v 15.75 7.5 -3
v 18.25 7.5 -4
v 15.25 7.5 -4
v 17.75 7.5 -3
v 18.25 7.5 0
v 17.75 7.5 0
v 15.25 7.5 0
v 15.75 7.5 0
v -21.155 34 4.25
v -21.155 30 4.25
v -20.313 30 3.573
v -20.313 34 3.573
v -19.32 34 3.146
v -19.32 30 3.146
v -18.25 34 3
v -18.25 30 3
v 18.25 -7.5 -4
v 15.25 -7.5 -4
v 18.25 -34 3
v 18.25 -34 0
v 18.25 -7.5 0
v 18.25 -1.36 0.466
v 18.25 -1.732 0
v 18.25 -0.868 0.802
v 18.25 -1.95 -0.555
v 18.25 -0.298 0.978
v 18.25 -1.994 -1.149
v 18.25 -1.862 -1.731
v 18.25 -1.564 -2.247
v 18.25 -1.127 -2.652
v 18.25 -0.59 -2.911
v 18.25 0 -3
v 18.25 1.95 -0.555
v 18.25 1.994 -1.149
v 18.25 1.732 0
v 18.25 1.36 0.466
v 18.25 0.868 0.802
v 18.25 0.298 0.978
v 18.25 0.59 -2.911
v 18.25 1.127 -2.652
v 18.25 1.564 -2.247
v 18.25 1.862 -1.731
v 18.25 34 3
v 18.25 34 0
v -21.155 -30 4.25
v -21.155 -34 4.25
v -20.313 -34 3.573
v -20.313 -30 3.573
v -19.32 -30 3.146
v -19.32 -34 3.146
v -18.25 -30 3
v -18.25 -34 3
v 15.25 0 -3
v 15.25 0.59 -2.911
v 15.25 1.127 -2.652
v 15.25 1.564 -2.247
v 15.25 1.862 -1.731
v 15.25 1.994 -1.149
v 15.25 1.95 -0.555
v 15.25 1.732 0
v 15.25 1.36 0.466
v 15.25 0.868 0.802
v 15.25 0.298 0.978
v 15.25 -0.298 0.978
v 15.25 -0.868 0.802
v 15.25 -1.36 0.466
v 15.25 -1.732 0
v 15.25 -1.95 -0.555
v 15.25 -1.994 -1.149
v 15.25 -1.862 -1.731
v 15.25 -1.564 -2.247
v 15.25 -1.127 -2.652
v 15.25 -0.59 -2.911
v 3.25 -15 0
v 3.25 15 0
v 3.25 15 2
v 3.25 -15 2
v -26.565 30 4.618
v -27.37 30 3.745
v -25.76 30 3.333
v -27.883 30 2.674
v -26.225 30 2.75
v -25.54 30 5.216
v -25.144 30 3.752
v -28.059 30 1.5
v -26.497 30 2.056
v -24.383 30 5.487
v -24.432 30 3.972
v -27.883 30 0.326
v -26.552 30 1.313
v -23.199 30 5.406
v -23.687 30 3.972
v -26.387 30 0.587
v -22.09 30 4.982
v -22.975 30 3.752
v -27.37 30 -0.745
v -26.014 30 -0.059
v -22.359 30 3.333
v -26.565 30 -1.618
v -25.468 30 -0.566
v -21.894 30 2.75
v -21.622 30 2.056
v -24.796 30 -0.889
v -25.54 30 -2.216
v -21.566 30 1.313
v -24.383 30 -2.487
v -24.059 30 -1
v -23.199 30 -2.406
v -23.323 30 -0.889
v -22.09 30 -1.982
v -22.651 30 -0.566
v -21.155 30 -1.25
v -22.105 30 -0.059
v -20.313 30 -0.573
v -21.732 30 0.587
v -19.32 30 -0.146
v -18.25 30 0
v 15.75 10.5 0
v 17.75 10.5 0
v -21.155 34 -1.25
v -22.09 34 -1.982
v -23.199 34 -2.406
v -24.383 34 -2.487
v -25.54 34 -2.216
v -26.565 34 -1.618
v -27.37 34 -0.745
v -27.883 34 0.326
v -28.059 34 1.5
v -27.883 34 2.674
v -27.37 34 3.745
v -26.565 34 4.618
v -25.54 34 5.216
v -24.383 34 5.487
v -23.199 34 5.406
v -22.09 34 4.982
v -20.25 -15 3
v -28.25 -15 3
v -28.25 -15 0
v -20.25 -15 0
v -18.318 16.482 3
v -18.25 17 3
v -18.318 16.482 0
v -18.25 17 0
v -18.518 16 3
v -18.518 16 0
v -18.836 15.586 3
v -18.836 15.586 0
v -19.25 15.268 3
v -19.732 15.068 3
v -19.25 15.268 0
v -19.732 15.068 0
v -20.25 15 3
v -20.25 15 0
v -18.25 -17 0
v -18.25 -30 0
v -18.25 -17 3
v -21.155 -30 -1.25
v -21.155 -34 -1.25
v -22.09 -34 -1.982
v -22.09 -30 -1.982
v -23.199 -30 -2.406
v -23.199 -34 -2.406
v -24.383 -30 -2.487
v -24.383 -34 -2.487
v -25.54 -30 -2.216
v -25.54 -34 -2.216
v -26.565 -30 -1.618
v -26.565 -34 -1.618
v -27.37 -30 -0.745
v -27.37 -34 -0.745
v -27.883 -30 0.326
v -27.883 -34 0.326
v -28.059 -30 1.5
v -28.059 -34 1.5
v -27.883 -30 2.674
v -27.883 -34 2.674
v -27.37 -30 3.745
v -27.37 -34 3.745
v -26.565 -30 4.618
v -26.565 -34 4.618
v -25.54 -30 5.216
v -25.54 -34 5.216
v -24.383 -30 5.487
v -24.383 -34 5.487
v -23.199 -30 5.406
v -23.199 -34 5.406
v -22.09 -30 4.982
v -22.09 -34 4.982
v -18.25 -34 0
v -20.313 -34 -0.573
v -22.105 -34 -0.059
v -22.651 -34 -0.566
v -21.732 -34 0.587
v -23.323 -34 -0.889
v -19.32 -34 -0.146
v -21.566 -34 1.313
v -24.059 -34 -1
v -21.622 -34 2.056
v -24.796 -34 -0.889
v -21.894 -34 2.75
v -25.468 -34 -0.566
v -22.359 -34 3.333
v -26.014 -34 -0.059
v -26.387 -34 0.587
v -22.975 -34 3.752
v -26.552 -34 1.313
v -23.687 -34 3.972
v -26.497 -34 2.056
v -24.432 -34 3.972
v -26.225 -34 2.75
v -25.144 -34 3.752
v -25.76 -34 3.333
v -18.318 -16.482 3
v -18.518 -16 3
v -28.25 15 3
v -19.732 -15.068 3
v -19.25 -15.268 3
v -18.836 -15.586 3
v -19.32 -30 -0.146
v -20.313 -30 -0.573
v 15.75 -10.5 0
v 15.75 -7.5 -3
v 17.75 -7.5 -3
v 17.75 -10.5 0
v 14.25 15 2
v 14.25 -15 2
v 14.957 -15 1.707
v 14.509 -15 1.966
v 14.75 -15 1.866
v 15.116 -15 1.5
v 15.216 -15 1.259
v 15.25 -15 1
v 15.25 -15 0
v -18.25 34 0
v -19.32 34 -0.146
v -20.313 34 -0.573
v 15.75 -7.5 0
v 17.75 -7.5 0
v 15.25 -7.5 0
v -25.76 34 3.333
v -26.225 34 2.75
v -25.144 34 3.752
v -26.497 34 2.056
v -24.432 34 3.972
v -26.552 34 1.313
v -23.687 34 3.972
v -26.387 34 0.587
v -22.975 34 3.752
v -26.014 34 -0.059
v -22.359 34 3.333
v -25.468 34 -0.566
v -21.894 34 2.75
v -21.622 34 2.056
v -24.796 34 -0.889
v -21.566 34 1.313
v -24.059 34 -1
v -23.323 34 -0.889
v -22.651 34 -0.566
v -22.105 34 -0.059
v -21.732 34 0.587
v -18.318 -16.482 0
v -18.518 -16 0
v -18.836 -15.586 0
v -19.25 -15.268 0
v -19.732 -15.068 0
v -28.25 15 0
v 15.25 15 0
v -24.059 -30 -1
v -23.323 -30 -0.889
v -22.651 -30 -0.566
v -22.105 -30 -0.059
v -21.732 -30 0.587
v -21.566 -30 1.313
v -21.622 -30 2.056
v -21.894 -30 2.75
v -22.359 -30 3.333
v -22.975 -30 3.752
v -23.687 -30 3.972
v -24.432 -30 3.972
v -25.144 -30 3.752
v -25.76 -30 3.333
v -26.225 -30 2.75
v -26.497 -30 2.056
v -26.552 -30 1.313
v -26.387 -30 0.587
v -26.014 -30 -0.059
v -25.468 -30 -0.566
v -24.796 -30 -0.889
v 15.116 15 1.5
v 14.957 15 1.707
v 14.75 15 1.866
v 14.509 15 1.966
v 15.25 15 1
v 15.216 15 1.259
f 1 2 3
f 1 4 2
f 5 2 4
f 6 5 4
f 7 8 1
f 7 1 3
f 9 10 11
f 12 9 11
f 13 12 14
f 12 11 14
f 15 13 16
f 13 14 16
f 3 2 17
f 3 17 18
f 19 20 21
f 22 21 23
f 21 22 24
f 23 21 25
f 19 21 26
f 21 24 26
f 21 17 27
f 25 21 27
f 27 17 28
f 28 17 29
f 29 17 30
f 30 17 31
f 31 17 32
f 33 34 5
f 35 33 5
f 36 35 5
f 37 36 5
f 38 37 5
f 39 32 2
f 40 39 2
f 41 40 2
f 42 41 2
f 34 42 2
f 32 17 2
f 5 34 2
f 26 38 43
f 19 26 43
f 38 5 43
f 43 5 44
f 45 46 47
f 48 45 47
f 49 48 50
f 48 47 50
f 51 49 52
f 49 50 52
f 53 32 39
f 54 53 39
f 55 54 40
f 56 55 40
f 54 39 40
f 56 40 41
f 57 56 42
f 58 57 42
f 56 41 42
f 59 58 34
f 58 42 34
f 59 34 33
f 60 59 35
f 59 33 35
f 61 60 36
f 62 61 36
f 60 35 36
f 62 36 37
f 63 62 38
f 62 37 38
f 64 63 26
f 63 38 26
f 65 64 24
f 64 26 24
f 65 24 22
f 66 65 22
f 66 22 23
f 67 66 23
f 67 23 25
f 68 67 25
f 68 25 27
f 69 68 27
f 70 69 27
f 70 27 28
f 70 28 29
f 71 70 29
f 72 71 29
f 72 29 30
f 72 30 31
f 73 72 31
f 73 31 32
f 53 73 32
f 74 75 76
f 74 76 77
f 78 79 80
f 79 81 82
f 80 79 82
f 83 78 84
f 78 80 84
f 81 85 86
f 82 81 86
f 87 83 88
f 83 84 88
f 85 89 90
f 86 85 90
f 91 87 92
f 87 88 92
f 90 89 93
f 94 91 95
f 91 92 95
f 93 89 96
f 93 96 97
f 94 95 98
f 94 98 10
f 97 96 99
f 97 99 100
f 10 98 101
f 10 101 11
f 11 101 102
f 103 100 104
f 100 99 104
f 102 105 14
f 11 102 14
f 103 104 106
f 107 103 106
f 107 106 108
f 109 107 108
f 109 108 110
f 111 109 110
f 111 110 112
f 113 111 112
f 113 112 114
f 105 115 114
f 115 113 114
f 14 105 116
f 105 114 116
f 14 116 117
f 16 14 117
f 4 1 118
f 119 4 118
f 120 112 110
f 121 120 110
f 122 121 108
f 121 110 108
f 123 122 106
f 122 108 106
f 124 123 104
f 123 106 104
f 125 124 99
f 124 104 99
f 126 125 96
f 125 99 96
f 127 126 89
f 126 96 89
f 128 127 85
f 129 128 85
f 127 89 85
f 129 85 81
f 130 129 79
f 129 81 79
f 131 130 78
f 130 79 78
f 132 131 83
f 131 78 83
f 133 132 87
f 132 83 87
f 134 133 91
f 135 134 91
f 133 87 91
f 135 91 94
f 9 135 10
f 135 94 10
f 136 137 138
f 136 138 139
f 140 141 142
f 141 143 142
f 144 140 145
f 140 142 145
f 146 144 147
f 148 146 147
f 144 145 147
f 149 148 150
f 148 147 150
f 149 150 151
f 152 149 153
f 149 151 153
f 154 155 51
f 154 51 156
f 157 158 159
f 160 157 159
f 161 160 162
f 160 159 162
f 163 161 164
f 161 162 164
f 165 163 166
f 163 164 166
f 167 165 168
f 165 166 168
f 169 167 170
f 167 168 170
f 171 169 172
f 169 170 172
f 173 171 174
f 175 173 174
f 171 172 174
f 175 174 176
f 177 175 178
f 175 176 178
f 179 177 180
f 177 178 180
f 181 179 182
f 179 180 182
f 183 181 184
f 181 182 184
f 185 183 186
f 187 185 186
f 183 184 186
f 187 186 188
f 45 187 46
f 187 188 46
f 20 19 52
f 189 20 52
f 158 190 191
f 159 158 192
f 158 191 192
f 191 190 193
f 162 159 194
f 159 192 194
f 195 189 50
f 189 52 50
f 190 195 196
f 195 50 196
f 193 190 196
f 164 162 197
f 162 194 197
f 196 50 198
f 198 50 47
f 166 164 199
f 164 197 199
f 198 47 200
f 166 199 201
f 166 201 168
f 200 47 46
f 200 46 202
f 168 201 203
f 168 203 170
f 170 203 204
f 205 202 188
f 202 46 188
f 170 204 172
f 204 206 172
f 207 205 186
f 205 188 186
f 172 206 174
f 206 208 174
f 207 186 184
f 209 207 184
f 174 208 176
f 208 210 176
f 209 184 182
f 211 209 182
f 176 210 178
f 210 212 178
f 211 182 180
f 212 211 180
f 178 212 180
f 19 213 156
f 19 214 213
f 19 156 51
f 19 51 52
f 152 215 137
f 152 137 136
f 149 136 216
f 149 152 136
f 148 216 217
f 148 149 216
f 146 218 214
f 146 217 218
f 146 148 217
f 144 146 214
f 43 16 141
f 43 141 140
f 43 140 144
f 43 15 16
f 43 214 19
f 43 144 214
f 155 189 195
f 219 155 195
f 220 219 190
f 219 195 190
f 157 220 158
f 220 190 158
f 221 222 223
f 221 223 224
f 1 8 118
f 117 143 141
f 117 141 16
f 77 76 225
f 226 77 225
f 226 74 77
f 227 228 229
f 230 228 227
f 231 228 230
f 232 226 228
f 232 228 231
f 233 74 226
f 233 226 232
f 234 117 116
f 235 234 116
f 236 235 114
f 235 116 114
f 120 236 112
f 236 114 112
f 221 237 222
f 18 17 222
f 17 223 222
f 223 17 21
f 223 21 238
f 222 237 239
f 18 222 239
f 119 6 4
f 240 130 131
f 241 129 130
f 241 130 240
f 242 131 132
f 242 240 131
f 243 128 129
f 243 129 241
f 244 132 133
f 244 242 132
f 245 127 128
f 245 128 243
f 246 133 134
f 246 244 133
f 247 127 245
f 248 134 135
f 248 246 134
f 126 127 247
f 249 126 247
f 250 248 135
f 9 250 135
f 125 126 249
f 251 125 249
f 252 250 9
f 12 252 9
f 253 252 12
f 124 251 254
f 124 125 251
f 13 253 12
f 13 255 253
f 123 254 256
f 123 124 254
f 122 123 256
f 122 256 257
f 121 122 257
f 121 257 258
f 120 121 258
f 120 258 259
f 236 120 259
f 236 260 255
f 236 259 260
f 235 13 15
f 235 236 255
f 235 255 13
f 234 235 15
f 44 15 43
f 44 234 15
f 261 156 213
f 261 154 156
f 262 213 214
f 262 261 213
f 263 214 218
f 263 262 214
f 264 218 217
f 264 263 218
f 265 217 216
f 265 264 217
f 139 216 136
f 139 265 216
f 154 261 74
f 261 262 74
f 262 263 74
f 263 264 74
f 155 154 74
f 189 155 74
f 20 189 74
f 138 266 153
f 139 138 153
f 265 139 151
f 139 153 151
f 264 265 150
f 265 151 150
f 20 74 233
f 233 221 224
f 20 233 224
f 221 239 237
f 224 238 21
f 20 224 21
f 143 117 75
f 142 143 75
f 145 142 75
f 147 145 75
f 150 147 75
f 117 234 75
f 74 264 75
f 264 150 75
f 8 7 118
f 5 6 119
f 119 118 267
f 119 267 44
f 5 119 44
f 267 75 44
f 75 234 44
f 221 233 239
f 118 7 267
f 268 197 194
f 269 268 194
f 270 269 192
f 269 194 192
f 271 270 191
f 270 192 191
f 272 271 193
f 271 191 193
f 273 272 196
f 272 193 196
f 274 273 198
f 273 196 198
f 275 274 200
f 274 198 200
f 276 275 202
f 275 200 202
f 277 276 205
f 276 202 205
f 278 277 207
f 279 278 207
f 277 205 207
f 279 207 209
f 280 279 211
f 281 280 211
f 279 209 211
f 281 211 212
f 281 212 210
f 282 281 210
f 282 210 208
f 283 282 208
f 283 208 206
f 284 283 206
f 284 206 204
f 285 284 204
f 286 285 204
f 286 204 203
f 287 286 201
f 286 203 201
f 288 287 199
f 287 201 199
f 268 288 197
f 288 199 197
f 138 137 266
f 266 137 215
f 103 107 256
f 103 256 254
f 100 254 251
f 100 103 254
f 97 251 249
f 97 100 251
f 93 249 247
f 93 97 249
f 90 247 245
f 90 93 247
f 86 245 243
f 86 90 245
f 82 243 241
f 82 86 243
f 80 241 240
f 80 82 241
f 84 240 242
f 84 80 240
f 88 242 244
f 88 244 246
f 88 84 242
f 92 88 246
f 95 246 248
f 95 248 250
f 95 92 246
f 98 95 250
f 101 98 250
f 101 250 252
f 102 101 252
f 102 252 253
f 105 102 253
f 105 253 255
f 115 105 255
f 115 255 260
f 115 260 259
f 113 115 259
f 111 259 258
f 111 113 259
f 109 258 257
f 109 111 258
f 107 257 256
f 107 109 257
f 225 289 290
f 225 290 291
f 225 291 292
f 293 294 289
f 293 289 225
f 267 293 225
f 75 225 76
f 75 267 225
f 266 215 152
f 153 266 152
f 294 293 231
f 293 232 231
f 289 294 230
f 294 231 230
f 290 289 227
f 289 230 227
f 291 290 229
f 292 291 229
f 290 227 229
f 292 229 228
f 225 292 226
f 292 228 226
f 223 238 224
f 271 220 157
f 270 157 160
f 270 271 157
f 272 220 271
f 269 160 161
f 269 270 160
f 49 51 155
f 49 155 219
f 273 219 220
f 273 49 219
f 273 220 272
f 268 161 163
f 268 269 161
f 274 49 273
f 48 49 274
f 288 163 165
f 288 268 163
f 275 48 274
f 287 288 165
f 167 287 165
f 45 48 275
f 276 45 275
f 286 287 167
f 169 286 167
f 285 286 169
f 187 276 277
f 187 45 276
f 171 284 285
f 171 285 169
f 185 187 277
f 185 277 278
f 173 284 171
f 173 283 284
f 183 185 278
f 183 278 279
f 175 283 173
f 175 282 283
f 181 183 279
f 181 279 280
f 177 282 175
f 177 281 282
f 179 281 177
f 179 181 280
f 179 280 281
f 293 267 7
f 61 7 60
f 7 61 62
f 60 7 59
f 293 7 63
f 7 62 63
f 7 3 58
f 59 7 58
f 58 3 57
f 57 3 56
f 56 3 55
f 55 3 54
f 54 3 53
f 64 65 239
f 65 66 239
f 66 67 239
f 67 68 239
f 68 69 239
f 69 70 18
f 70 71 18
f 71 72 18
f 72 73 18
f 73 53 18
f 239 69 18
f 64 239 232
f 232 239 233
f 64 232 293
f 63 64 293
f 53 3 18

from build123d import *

# Parameters (mm, degrees)
SKETCH_1_W          = 36.5
SKETCH_1_H          = 68
EXTRUDE_1_DEPTH     = 3
SKETCH_2_R          = 2.5
EXTRUDE_2_DEPTH     = 4
EXTRUDE_START       = -4
EXTRUDE_3_DEPTH     = 4
CUT_EXTRUDE_START   = -4
SKETCH_4_R          = 2.5
CUT_EXTRUDE_1_DEPTH = 4
SKETCH_5_W          = 3
SKETCH_5_H          = 15
EXTRUDE_4_DEPTH     = 4
CUT_EXTRUDE_2_DEPTH = 2
SKETCH_7_R          = 2
CUT_EXTRUDE_3_DEPTH = 5
EXTRUDE_5_DEPTH     = 1
SKETCH_9_W          = 10
SKETCH_9_H          = 30
EXTRUDE_6_DEPTH     = 3
FILLET_1_R          = 2
FILLET_2_R          = 1


with BuildPart() as part:
    # 草图1 → 凸台-拉伸1 (new body)
    with BuildSketch(Plane.XY):
        Rectangle(SKETCH_1_W, SKETCH_1_H)
    extrude(amount=EXTRUDE_1_DEPTH)

    # 草图2 → 凸台-拉伸2 (add)
    with BuildSketch(Plane.XZ.offset(34)):
        with BuildLine():
            Line((-18.25, 3), (-18.25, 0))
            ThreePointArc((-18.25, 0), (-19.83113883, -0.325765386), (-21.15473751, -1.25))
            ThreePointArc((-21.15473751, -1.25), (-28.059475019, 1.5), (-21.15473751, 4.25))
            ThreePointArc((-21.15473751, 4.25), (-19.83113883, 3.325765386), (-18.25, 3))
        make_face()
        with Locations(Location((-24.059475019, 1.5, 0), (0, 0, 270))):
            Circle(SKETCH_2_R, mode=Mode.SUBTRACT)
    extrude(amount=-EXTRUDE_2_DEPTH)

    # 草图3 → 凸台-拉伸3 (add)
    with BuildSketch(Plane(origin=(0, 34, 0), x_dir=(1, 0, 0), z_dir=(0, 1, 0)).offset(EXTRUDE_START)):
        with BuildLine():
            Line((-18.25, -3), (-18.25, 0))
            ThreePointArc((-18.25, 0), (-19.83113883, 0.325765386), (-21.15473751, 1.25))
            ThreePointArc((-21.15473751, 1.25), (-28.059475019, -1.5), (-21.15473751, -4.25))
            ThreePointArc((-21.15473751, -4.25), (-19.83113883, -3.325765386), (-18.25, -3))
        make_face()
    extrude(amount=EXTRUDE_3_DEPTH)

    # 草图4 → 切除-拉伸1 (cut)
    with BuildSketch(Plane(origin=(0, 34, 0), x_dir=(1, 0, 0), z_dir=(0, 1, 0)).offset(CUT_EXTRUDE_START)):
        with Locations(Location((-24.059475019, -1.5, 0), (0, 0, 90))):
            Circle(SKETCH_4_R)
    extrude(amount=CUT_EXTRUDE_1_DEPTH, mode=Mode.SUBTRACT)

    # 草图5 → 凸台-拉伸4 (add)
    with BuildSketch(Plane(origin=(0, 0, 0), x_dir=(-1, 0, 0), z_dir=(0, 0, -1))):
        with Locations((-16.75, 0)):
            Rectangle(SKETCH_5_W, SKETCH_5_H)
    extrude(amount=EXTRUDE_4_DEPTH)

    # 草图6 → 切除-拉伸2 (cut)
    with BuildSketch(Plane(origin=(0, 0, 0), x_dir=(-1, 0, 0), z_dir=(0, 0, -1))):
        Polygon((-15.25, 7.5), (-15.25, 15), (-3.25, 15), (-3.25, -15), (-15.25, -15), (-15.25, -7.5), align=None)
    extrude(amount=-CUT_EXTRUDE_2_DEPTH, mode=Mode.SUBTRACT)

    # 草图7 → 切除-拉伸3 (cut)
    with BuildSketch(Plane(origin=(18.25, 0, 0), x_dir=(0, 0, -1), z_dir=(1, 0, 0))):
        with Locations((1, 0)):
            Circle(SKETCH_7_R)
    extrude(amount=-CUT_EXTRUDE_3_DEPTH, mode=Mode.SUBTRACT)

    # 草图8 → 凸台-拉伸5 (add, symmetric)
    with BuildSketch(Plane.ZY.offset(-16.75)):
        Polygon((-3, 7.5), (0, 10.5), (0, 7.5), align=None)
    extrude_5 = extrude(amount=EXTRUDE_5_DEPTH, both=True)

    # 镜向1: 凸台-拉伸5 across plane
    add(extrude_5.mirror(Plane.ZX))

    # 草图9 → 凸台-拉伸6 (add)
    with BuildSketch(Plane.XY.offset(3)):
        with Locations((-23.25, 0)):
            Rectangle(SKETCH_9_W, SKETCH_9_H)
    extrude(amount=-EXTRUDE_6_DEPTH)

    # 圆角1
    fillet_1_edges = [part.edges().sort_by_distance(p)[0] for p in [
        (-18.25, 15, 1.5),
        (-18.25, -15, 1.5),
    ]]
    fillet(fillet_1_edges, radius=FILLET_1_R)

    # 圆角2
    fillet_2_edges = [part.edges().sort_by_distance(p)[0] for p in [
        (15.25, 0, 2),
    ]]
    fillet(fillet_2_edges, radius=FILLET_2_R - 0.0001)  # a hair under: the kernel refuses the full size


solid = part.part
